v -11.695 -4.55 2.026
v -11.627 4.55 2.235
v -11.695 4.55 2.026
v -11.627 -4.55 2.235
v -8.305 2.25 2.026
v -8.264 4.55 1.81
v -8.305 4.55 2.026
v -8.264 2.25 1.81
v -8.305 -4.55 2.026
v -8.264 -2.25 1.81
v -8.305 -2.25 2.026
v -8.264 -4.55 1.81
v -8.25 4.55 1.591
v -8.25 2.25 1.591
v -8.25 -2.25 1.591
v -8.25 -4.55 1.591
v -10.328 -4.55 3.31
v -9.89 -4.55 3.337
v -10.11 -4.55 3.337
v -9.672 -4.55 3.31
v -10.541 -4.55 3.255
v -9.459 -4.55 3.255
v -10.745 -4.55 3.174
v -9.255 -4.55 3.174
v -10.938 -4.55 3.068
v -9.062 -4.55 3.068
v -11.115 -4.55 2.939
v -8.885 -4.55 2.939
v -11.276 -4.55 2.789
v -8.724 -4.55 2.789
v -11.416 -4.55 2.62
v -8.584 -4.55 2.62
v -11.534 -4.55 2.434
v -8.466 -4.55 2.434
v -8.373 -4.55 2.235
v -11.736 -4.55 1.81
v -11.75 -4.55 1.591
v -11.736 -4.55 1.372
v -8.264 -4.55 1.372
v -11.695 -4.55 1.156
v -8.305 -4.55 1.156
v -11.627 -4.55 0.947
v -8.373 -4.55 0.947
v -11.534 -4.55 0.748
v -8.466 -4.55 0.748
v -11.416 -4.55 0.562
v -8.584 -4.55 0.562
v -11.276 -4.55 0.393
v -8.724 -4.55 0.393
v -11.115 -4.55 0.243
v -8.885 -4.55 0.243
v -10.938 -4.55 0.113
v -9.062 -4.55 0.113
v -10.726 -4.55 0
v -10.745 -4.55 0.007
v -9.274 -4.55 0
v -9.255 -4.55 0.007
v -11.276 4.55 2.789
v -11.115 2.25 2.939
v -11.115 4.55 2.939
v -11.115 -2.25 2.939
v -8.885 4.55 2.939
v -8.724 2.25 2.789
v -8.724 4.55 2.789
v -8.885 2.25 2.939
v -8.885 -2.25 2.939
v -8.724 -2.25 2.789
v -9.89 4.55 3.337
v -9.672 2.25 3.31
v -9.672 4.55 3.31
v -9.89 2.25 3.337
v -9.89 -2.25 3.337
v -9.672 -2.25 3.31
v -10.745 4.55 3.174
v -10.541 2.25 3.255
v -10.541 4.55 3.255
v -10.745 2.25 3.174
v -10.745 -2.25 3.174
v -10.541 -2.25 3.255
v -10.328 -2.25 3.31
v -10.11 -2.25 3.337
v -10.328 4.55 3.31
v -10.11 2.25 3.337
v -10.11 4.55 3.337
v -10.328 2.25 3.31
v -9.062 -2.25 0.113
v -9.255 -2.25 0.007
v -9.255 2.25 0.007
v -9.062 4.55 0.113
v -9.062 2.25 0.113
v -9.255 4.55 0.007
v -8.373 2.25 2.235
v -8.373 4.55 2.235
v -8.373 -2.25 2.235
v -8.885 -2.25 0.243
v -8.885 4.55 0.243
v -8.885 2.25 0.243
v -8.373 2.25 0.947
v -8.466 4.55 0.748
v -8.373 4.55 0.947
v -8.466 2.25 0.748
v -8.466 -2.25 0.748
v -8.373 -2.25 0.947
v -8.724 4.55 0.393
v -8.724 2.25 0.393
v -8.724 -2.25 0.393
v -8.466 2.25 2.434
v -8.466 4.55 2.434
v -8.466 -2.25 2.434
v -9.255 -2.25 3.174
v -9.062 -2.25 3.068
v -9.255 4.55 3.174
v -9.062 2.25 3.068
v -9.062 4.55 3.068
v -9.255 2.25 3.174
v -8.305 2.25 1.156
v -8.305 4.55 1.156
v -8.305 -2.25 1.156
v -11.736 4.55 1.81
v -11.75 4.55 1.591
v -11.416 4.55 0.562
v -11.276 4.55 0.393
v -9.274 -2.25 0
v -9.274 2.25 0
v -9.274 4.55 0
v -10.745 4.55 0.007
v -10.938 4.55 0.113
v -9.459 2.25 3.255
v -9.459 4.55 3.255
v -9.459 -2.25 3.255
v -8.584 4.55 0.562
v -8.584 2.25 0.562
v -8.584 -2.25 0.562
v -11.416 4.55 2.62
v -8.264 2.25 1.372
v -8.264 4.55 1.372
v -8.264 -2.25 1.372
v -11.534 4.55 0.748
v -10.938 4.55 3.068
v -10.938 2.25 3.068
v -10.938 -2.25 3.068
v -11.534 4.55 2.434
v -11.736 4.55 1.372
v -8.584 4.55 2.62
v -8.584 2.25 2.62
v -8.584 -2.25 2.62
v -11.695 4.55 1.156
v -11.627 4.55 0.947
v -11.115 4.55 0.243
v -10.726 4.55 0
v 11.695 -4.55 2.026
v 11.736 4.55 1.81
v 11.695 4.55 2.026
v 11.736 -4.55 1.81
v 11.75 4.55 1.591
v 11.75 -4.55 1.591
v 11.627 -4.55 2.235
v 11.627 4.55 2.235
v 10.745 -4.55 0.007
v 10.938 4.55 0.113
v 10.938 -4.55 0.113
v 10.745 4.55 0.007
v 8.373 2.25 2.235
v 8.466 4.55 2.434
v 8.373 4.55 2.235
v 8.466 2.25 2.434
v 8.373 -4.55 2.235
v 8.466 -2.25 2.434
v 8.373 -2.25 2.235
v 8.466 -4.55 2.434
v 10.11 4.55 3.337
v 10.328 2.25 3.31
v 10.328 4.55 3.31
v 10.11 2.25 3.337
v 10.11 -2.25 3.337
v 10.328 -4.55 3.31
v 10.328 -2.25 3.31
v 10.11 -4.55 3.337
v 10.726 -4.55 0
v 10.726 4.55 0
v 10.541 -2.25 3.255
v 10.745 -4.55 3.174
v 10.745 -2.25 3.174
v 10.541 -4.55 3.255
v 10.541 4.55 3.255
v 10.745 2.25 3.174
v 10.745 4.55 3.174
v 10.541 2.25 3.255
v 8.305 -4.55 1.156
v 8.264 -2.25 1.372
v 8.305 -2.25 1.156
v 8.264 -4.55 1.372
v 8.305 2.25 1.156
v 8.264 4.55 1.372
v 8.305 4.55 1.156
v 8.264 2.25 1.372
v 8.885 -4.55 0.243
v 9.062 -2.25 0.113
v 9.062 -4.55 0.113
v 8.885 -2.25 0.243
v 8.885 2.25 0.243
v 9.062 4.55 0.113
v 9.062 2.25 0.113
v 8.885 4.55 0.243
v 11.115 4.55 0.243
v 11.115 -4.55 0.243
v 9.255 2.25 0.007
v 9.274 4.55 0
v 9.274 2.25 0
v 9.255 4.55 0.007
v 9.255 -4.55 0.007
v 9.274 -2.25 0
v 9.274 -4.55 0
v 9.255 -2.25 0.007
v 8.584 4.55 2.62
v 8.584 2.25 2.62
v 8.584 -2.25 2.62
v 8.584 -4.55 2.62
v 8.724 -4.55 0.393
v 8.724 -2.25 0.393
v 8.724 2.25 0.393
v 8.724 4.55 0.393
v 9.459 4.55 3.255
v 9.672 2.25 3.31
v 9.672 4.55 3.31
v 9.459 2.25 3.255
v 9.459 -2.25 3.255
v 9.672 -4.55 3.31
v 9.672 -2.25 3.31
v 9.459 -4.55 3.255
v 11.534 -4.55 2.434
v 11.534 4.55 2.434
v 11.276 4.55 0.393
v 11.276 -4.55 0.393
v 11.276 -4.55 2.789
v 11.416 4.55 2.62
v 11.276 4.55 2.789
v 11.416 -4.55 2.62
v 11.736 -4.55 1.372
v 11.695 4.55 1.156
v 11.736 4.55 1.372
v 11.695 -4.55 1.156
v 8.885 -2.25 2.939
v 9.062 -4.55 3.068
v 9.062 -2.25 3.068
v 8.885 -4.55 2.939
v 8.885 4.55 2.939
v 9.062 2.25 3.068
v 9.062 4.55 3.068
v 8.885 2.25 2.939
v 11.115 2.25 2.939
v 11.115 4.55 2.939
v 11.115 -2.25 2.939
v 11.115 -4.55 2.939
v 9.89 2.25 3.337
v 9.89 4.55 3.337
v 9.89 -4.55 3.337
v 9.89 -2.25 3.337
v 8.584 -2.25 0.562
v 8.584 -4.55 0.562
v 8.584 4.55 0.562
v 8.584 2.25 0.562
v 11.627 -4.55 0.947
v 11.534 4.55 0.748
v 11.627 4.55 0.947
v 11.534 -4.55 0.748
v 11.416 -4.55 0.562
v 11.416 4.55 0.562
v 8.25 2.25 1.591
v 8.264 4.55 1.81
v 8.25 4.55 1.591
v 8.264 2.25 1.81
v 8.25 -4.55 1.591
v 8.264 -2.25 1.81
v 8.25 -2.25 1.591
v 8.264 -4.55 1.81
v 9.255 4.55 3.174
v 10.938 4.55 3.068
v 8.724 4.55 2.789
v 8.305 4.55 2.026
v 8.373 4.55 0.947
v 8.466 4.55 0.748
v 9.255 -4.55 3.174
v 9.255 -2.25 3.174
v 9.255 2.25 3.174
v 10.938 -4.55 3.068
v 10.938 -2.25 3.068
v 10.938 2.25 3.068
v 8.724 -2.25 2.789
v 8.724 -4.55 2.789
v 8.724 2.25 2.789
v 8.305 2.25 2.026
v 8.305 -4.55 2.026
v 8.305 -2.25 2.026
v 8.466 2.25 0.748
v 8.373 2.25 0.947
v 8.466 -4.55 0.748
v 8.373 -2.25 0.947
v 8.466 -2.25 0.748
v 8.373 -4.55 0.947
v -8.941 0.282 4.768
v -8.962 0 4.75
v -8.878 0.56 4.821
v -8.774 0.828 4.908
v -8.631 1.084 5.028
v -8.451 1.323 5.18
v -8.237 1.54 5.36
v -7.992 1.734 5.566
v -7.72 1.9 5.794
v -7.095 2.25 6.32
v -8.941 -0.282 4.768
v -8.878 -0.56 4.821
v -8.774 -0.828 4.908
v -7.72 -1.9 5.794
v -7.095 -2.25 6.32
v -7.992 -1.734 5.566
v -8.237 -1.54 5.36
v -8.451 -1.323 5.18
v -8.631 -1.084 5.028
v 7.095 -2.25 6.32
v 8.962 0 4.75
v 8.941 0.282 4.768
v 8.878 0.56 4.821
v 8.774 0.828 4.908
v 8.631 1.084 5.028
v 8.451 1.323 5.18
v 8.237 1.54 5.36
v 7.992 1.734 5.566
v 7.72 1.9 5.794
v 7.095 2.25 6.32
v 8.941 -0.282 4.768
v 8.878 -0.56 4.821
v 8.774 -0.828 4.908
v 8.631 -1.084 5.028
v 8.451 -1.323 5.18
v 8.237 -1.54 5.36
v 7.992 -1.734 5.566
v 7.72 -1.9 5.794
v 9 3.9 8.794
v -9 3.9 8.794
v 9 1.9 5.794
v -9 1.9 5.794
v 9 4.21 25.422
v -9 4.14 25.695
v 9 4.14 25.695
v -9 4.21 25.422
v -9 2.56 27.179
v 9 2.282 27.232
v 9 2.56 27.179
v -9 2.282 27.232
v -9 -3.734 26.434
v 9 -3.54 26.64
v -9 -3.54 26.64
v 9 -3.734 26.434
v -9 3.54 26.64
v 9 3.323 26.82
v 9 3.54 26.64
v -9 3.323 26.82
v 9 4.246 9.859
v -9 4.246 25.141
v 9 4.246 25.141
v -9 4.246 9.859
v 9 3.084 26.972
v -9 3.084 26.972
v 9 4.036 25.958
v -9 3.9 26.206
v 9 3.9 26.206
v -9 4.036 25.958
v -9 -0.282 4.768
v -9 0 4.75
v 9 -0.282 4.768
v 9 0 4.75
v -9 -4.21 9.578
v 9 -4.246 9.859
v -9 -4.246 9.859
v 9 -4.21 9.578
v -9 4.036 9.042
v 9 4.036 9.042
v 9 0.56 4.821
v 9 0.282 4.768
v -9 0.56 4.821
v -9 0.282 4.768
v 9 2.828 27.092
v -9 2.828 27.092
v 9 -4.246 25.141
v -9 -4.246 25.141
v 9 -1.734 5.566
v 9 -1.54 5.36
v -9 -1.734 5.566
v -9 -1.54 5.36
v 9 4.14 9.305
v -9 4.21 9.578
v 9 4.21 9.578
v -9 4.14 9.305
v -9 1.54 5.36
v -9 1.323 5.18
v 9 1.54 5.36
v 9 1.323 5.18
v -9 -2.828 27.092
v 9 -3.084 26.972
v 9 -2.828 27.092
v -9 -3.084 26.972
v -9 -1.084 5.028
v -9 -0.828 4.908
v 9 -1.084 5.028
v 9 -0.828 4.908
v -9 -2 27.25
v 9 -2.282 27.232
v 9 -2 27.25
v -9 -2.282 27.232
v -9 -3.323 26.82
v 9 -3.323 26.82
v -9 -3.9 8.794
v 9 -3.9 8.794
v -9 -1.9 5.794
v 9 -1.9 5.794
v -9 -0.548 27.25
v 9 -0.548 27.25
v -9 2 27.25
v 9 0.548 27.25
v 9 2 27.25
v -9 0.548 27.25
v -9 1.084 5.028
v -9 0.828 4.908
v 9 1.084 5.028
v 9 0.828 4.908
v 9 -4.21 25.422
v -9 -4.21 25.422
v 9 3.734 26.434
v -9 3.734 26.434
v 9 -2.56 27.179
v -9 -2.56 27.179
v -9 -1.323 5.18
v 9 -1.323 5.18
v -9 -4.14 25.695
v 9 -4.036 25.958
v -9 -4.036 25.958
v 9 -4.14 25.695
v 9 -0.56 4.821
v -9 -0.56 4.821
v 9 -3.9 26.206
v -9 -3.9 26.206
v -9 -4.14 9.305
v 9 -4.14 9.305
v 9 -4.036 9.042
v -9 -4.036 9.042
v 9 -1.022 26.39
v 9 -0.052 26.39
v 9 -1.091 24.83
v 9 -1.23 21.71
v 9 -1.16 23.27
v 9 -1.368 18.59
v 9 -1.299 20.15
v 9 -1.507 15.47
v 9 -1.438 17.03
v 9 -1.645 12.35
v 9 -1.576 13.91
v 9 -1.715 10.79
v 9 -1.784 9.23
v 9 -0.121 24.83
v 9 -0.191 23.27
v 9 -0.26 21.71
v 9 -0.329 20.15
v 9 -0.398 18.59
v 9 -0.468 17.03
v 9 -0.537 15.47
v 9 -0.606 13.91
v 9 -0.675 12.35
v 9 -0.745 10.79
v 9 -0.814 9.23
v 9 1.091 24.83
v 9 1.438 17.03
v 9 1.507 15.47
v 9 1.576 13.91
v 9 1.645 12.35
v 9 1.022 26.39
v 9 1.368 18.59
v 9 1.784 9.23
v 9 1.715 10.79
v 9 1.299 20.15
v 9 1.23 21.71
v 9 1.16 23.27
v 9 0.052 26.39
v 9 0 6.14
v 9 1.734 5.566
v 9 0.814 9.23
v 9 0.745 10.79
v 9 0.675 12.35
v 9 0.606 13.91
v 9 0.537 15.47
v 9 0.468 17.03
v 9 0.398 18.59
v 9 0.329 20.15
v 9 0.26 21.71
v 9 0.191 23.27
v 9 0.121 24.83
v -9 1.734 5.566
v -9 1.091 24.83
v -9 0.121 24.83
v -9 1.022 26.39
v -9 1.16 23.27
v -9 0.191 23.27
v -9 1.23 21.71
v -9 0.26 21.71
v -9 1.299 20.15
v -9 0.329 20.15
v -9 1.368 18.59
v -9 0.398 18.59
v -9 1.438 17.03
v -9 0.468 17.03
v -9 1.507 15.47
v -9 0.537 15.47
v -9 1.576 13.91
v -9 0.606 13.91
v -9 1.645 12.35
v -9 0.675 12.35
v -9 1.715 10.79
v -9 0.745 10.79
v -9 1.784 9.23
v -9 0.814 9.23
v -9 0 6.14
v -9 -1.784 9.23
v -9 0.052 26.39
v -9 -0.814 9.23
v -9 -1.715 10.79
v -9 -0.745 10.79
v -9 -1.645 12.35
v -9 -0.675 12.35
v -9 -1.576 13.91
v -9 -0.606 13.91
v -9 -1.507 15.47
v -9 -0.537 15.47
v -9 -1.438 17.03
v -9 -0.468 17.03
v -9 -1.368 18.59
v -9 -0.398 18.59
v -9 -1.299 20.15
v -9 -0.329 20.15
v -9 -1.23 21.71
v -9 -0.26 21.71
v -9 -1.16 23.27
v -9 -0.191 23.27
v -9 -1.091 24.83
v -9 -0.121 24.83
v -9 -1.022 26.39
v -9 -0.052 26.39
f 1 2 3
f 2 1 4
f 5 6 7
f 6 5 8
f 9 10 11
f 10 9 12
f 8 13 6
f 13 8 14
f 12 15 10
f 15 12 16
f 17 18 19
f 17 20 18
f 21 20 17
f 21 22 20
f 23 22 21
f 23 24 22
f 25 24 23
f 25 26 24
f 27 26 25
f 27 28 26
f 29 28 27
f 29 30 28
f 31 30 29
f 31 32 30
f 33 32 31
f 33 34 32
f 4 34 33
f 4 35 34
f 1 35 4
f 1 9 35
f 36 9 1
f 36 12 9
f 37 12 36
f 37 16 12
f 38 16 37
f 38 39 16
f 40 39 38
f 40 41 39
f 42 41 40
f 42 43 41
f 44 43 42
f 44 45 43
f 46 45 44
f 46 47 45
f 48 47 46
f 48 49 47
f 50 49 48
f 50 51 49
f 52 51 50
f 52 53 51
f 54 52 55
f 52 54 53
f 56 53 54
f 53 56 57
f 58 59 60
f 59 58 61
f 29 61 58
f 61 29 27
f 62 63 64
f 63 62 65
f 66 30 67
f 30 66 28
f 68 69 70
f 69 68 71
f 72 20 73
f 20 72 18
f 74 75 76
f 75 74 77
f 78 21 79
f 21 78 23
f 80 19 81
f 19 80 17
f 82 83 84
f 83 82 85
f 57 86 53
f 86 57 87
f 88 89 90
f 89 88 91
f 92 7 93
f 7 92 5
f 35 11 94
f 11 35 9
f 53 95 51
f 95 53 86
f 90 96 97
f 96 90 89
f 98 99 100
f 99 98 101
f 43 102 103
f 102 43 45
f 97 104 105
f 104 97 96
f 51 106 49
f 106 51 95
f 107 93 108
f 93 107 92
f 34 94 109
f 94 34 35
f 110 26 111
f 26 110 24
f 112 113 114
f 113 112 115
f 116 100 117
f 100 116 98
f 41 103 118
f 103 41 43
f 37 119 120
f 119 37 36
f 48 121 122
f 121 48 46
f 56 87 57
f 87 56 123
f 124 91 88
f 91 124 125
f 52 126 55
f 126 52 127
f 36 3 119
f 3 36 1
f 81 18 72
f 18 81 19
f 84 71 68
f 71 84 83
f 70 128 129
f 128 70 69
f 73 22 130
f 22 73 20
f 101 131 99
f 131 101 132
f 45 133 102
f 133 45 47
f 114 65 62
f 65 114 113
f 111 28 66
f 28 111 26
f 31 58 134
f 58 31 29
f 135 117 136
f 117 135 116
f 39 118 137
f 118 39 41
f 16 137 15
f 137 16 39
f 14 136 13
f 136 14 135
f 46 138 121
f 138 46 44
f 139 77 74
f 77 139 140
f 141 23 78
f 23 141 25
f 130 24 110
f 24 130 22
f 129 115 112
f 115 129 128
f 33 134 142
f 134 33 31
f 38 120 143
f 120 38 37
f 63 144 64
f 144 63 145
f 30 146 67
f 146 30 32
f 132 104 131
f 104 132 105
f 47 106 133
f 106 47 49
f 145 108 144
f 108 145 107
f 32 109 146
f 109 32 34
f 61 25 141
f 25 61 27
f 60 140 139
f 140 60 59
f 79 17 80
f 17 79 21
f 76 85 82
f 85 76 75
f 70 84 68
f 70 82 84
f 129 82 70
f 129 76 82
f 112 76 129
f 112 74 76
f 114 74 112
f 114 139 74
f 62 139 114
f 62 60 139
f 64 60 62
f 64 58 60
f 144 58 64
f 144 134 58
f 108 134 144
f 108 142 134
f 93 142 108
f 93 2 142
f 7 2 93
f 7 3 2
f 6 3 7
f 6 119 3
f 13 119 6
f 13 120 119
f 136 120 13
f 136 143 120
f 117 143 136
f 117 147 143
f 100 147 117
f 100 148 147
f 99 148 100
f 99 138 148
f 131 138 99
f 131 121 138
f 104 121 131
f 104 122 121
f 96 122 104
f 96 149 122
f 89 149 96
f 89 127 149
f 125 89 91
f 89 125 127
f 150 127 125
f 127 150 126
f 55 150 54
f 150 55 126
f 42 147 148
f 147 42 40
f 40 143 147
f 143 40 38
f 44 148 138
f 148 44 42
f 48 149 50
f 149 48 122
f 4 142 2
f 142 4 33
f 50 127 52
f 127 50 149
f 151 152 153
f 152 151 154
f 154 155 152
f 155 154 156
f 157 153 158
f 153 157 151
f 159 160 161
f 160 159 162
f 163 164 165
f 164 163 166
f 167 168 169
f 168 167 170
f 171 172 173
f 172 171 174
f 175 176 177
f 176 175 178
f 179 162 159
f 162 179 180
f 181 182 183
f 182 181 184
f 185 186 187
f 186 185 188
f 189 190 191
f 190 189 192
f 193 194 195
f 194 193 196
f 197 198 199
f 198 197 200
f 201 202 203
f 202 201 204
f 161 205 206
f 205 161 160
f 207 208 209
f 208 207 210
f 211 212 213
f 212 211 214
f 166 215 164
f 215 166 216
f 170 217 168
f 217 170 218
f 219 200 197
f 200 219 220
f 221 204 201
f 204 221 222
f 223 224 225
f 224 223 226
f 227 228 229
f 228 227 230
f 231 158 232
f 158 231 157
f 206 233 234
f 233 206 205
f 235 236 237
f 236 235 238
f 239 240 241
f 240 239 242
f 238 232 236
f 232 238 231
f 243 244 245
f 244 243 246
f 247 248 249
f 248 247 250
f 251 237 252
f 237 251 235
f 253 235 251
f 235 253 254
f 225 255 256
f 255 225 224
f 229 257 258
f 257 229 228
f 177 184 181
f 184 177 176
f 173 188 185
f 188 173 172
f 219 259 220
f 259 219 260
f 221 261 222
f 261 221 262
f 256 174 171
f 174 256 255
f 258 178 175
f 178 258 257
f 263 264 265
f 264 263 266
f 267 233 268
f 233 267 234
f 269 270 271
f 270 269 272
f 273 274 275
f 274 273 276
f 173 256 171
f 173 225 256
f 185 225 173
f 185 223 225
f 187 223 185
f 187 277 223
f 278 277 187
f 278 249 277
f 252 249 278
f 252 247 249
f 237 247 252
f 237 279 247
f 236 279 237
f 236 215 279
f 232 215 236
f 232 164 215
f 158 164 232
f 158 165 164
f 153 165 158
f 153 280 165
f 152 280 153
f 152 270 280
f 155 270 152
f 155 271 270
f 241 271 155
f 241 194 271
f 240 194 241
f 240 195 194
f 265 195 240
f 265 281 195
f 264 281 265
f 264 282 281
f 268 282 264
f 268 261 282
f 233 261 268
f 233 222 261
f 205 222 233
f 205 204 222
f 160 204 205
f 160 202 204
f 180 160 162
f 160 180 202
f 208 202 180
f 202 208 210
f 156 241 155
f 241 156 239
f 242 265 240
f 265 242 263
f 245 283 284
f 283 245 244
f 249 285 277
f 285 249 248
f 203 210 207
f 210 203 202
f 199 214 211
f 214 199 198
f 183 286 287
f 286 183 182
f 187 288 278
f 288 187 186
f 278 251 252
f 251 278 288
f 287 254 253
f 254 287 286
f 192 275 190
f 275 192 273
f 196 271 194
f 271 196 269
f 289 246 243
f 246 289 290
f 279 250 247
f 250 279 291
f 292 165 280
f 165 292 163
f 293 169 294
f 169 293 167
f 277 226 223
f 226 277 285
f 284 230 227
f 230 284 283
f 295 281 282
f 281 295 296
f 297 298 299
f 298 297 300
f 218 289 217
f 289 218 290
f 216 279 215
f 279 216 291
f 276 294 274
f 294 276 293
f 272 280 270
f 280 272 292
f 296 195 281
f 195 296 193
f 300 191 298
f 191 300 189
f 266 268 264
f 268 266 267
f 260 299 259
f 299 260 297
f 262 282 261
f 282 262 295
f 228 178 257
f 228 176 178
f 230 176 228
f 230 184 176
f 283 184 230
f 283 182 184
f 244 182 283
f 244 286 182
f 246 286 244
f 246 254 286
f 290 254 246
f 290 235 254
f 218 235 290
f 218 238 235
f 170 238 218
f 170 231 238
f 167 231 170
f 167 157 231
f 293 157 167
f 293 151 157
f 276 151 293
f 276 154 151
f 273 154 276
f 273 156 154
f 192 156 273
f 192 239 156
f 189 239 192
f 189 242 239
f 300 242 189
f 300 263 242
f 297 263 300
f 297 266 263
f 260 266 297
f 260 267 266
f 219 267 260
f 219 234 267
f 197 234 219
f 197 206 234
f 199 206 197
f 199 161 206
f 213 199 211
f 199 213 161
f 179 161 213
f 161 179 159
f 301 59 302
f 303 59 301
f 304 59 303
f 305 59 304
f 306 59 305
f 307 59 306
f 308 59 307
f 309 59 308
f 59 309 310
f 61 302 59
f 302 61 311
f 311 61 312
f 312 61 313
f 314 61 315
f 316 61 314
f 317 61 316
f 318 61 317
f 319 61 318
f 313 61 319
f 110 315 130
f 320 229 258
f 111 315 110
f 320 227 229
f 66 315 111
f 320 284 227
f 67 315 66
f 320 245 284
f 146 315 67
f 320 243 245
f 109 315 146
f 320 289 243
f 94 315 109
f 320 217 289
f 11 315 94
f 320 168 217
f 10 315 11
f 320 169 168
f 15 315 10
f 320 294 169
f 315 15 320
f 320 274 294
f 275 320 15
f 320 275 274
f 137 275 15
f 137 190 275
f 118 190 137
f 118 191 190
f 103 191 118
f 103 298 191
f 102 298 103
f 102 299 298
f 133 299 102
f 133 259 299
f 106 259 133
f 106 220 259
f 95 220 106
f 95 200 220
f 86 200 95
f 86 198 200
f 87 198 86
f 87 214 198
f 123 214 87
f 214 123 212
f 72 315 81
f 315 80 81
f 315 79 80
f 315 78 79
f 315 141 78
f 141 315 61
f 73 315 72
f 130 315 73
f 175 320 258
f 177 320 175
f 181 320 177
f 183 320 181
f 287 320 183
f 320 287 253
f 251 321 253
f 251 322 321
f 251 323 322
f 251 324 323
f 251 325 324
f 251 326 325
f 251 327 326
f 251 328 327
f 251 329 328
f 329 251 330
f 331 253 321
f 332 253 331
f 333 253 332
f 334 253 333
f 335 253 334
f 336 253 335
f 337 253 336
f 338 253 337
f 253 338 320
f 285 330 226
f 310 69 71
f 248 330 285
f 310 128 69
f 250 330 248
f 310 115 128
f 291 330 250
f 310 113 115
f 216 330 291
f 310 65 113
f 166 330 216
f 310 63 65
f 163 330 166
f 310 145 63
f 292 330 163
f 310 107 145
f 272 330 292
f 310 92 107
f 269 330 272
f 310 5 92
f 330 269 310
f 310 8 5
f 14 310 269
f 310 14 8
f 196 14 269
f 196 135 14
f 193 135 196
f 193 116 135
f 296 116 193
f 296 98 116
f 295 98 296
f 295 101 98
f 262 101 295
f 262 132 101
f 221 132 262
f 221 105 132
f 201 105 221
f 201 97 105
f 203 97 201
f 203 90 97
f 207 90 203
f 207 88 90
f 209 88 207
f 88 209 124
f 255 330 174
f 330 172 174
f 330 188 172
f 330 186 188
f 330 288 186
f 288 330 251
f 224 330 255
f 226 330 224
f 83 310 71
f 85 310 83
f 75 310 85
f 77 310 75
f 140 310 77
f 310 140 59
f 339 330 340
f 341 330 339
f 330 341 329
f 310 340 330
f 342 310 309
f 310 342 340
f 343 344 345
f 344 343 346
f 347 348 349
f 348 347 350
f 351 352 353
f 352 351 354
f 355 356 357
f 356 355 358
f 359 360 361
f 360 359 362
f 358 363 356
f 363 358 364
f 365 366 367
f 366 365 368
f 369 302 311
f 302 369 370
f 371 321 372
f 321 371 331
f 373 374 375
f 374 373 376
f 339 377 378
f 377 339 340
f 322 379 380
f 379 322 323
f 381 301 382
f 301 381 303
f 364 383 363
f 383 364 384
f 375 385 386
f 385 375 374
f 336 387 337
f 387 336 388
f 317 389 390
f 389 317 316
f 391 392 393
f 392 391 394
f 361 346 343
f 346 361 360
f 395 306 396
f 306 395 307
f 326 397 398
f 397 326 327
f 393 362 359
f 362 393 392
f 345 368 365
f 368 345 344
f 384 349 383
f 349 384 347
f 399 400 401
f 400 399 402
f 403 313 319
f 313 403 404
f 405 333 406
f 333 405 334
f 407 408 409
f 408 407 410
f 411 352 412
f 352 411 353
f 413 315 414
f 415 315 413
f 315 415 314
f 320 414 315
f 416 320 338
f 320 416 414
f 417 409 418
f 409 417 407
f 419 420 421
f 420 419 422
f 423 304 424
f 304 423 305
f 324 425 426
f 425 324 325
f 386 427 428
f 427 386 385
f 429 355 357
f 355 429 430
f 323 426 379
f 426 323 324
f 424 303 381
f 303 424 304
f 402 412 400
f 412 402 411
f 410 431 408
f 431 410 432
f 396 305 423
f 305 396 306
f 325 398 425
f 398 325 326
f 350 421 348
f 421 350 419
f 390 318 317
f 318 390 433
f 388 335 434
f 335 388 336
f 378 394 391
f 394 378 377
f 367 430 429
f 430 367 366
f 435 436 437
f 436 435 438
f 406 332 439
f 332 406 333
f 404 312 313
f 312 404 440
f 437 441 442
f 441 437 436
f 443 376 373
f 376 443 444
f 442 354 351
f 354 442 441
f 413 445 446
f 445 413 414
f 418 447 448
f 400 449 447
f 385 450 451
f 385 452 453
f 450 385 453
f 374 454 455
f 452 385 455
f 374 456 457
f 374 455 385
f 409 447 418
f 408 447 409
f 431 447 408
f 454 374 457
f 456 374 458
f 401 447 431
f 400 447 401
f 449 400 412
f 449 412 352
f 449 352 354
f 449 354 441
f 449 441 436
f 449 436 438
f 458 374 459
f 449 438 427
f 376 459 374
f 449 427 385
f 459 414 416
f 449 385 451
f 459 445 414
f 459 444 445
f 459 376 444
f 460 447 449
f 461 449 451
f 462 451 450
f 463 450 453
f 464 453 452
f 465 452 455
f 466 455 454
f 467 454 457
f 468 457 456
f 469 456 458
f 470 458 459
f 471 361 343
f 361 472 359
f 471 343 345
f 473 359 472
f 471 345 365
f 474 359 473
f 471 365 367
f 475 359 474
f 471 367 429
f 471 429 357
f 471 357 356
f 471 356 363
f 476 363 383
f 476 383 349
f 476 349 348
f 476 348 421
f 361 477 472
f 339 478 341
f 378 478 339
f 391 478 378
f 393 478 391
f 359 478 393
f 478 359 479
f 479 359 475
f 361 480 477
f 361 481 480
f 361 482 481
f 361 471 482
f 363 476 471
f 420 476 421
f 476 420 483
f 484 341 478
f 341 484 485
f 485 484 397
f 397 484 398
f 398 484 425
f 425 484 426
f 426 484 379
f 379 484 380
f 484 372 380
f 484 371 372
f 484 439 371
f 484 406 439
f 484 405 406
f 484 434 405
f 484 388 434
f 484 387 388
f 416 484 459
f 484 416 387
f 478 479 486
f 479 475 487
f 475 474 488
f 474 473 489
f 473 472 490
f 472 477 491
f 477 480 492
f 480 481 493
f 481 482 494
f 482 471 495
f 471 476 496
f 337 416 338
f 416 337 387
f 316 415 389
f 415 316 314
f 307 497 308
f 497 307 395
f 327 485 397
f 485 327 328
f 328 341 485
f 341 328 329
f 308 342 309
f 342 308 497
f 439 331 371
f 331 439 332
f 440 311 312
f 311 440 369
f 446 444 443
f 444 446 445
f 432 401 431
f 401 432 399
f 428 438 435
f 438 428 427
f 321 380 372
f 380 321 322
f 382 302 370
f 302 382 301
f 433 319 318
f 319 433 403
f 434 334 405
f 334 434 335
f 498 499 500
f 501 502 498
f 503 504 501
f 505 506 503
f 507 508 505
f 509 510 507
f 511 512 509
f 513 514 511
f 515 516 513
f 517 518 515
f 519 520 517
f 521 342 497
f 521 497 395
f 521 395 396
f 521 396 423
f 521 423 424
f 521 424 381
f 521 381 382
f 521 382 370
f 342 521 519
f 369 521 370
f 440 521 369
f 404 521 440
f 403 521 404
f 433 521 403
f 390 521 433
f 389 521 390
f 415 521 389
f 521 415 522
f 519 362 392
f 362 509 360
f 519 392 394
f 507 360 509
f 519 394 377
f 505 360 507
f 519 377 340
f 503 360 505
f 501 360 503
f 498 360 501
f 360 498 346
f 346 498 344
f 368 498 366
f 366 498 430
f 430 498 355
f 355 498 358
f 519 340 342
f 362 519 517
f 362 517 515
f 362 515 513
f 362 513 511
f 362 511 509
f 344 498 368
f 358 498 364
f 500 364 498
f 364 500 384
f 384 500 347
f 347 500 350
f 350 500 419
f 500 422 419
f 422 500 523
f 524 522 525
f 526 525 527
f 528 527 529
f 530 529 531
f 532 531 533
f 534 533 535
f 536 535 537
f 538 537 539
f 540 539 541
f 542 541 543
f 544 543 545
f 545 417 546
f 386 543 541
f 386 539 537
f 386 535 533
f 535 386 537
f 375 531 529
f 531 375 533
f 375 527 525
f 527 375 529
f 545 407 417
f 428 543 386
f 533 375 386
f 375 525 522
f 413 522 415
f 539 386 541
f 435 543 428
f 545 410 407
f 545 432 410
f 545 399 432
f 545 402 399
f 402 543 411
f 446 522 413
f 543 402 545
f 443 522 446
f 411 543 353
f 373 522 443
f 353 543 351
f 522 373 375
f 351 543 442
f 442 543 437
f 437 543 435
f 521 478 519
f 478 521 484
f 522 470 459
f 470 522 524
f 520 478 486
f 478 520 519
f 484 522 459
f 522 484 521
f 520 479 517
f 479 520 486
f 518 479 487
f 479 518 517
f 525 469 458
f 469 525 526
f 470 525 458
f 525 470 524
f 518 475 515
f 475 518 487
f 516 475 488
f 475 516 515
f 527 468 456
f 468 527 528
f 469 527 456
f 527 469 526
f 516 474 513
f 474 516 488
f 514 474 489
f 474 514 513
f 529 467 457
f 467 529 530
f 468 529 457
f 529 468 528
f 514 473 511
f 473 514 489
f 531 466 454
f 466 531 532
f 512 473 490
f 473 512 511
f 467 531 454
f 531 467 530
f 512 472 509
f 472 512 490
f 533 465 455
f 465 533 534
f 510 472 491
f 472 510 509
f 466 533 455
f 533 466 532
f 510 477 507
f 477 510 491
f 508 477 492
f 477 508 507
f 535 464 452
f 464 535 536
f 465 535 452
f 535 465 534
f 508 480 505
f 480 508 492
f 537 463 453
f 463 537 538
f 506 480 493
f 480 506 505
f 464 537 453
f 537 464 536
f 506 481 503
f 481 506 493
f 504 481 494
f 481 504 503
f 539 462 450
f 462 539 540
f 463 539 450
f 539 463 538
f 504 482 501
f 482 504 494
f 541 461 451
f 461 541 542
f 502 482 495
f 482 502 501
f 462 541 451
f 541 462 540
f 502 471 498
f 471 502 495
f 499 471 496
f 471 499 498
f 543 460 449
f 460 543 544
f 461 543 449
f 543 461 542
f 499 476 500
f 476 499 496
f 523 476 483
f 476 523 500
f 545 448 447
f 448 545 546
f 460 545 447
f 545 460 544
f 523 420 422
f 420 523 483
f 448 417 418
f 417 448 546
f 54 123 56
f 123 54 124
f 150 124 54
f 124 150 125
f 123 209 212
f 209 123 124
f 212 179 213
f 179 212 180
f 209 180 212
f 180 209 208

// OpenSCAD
rail_width = 4.5; // 6.3
inner_width = 9.1; // 9.4
depth = 3.5; // 8.5
resolution =  50;
clamp = true;
hook = false;

difference() {
	union() {
		// knobs
		translate([-10,0,depth/2.2]) rotate([90,0,0]) cylinder(h=inner_width, d=depth, center=true, $fn=resolution);
		translate([10,0,depth/2.2]) rotate([90,0,0]) cylinder(h=inner_width, d=depth, center=true, $fn=resolution);

		// main shape
		hull() {
			translate([-10,0,depth/2.2]) rotate([90,0,0]) cylinder(h=rail_width, d=depth, center=true, $fn=resolution);
			translate([10,0,depth/2.2]) rotate([90,0,0]) cylinder(h=rail_width, d=depth, center=true, $fn=resolution);
			translate([0,0,10]) rotate([90,0,0]) cylinder(h=rail_width, d=depth, center=true, $fn=resolution);
		}

		// clamp
		hull() {
			translate([0,0,7]) rotate([0,90,0]) cylinder(h=18, d=rail_width, center=true, $fn=resolution);
			translate([0,2,10]) rotate([0,90,0]) cylinder(h=18, d=rail_width, center=true, $fn=resolution);
			translate([0,-2,10]) rotate([0,90,0]) cylinder(h=18, d=rail_width, center=true, $fn=resolution);
			translate([0,2,25]) rotate([0,90,0]) cylinder(h=18, d=rail_width, center=true, $fn=resolution);
			translate([0,-2,25]) rotate([0,90,0]) cylinder(h=18, d=rail_width, center=true, $fn=resolution);
		}
	}
	
	// teeth
	if(clamp) {
		for (i = [8:20]) {
			translate([0,0,-4.6+(i*1.6)]) rotate([0,90,0]) cylinder(30,2.7 - (i*0.08),2.7 - (i*0.08),$fn=3,center=true);
		}
	}
	if(hook) {
		hull() {
			translate([0,0,13]) rotate([90,0,0]) cylinder(h=18, d=rail_width, center=true, $fn=resolution);
			translate([0,0,20]) rotate([90,0,0]) cylinder(h=18, d=rail_width, center=true, $fn=resolution);
			translate([-7,0,13]) rotate([90,0,0]) cylinder(h=18, d=rail_width, center=true, $fn=resolution);
		}
	}
	
	// ground
	translate([0,0,-10]) cube([30,20,20], center = true);

}
